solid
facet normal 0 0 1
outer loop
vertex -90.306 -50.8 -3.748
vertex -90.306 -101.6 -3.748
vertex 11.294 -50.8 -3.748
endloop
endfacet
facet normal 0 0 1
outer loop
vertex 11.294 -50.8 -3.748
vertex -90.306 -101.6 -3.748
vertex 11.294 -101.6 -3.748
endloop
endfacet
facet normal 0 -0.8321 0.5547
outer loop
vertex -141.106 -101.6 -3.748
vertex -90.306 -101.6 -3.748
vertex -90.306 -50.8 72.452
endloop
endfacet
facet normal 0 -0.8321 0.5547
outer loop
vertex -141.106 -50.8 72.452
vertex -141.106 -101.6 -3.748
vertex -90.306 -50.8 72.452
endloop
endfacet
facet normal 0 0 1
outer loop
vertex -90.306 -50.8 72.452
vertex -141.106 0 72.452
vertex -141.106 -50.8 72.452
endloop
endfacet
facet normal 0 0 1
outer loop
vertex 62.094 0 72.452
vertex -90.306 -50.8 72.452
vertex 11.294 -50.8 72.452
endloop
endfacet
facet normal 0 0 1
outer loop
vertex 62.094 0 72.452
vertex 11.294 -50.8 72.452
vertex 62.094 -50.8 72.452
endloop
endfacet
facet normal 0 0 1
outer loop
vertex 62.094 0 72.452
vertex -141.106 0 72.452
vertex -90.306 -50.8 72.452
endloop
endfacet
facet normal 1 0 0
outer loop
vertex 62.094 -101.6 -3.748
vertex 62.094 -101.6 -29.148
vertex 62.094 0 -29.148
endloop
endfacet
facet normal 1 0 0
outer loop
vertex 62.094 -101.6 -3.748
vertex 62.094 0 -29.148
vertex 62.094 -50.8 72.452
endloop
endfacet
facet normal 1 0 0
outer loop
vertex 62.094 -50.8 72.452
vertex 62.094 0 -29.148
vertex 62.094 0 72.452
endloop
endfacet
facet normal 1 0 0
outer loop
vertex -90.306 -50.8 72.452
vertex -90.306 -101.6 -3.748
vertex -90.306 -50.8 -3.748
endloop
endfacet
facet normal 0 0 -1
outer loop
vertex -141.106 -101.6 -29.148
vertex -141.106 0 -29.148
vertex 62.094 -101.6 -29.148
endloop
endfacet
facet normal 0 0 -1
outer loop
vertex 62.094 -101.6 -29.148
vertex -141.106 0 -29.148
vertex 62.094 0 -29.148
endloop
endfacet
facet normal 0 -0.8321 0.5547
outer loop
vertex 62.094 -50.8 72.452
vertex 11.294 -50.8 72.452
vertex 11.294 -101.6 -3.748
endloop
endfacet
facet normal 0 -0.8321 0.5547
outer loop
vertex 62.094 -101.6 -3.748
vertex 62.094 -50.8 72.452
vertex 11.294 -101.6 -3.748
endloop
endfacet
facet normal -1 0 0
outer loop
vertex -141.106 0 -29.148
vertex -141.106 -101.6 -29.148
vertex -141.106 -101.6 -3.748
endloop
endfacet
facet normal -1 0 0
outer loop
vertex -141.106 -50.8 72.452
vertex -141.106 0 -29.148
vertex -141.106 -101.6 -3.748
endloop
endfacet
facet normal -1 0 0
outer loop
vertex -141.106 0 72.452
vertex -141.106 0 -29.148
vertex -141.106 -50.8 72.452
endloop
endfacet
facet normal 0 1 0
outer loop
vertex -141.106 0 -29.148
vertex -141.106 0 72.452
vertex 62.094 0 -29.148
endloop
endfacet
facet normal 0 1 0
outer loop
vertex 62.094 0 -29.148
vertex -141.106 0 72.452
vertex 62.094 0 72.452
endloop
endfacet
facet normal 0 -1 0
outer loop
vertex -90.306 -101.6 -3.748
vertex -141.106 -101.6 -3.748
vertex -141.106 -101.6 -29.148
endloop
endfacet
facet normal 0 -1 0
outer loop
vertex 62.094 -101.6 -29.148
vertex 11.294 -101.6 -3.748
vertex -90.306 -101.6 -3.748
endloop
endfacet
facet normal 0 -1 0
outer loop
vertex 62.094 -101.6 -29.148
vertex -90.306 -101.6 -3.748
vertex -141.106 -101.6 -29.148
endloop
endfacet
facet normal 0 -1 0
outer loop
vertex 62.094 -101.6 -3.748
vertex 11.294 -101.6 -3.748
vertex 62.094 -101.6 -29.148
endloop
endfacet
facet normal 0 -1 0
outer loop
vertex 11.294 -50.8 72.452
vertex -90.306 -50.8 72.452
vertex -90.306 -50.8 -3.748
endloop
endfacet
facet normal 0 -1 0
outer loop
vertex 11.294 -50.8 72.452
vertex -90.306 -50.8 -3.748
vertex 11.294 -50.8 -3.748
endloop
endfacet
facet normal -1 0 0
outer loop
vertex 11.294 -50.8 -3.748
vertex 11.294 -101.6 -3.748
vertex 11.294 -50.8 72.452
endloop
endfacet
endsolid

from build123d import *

# Parameters (mm, degrees)
F0_W     = 203.2
F0_H     = 101.6
F1_DEPTH = 101.6
F2_W     = 101.6
F2_H     = 76.2
F3_DEPTH = 50.8
F5_DEPTH = 50.8
F7_DEPTH = 50.8


with BuildPart() as f1:
    # F0 (on Front) → F1 (new body)
    with BuildSketch(Plane.XZ):
        with Locations((-39.505829, 21.651511)):
            Rectangle(F0_W, F0_H)
    extrude(amount=F1_DEPTH)

    # F2 (on face) → F3 (cut)
    with BuildSketch(Plane.XZ.offset(101.6)):
        with Locations((-39.505829, 34.351511)):
            Rectangle(F2_W, F2_H)
    extrude(amount=-F3_DEPTH, mode=Mode.SUBTRACT)

    # F4 (on face) → F5 (cut)
    with BuildSketch(Plane.YZ.offset(-90.305829)):
        Polygon((-101.6, 72.451511), (-101.6, -3.748489), (-50.8, 72.451511), align=None)
    extrude(amount=-F5_DEPTH, mode=Mode.SUBTRACT)

    # F6 (on face) → F7 (cut)
    with BuildSketch(Plane(origin=(11.294171, 0, 0), x_dir=(0, -1, 0), z_dir=(-1, 0, 0))):
        Polygon((101.6, 72.451511), (50.8, 72.451511), (101.6, -3.748489), align=None)
    extrude(amount=-F7_DEPTH, mode=Mode.SUBTRACT)


solid = f1.part
